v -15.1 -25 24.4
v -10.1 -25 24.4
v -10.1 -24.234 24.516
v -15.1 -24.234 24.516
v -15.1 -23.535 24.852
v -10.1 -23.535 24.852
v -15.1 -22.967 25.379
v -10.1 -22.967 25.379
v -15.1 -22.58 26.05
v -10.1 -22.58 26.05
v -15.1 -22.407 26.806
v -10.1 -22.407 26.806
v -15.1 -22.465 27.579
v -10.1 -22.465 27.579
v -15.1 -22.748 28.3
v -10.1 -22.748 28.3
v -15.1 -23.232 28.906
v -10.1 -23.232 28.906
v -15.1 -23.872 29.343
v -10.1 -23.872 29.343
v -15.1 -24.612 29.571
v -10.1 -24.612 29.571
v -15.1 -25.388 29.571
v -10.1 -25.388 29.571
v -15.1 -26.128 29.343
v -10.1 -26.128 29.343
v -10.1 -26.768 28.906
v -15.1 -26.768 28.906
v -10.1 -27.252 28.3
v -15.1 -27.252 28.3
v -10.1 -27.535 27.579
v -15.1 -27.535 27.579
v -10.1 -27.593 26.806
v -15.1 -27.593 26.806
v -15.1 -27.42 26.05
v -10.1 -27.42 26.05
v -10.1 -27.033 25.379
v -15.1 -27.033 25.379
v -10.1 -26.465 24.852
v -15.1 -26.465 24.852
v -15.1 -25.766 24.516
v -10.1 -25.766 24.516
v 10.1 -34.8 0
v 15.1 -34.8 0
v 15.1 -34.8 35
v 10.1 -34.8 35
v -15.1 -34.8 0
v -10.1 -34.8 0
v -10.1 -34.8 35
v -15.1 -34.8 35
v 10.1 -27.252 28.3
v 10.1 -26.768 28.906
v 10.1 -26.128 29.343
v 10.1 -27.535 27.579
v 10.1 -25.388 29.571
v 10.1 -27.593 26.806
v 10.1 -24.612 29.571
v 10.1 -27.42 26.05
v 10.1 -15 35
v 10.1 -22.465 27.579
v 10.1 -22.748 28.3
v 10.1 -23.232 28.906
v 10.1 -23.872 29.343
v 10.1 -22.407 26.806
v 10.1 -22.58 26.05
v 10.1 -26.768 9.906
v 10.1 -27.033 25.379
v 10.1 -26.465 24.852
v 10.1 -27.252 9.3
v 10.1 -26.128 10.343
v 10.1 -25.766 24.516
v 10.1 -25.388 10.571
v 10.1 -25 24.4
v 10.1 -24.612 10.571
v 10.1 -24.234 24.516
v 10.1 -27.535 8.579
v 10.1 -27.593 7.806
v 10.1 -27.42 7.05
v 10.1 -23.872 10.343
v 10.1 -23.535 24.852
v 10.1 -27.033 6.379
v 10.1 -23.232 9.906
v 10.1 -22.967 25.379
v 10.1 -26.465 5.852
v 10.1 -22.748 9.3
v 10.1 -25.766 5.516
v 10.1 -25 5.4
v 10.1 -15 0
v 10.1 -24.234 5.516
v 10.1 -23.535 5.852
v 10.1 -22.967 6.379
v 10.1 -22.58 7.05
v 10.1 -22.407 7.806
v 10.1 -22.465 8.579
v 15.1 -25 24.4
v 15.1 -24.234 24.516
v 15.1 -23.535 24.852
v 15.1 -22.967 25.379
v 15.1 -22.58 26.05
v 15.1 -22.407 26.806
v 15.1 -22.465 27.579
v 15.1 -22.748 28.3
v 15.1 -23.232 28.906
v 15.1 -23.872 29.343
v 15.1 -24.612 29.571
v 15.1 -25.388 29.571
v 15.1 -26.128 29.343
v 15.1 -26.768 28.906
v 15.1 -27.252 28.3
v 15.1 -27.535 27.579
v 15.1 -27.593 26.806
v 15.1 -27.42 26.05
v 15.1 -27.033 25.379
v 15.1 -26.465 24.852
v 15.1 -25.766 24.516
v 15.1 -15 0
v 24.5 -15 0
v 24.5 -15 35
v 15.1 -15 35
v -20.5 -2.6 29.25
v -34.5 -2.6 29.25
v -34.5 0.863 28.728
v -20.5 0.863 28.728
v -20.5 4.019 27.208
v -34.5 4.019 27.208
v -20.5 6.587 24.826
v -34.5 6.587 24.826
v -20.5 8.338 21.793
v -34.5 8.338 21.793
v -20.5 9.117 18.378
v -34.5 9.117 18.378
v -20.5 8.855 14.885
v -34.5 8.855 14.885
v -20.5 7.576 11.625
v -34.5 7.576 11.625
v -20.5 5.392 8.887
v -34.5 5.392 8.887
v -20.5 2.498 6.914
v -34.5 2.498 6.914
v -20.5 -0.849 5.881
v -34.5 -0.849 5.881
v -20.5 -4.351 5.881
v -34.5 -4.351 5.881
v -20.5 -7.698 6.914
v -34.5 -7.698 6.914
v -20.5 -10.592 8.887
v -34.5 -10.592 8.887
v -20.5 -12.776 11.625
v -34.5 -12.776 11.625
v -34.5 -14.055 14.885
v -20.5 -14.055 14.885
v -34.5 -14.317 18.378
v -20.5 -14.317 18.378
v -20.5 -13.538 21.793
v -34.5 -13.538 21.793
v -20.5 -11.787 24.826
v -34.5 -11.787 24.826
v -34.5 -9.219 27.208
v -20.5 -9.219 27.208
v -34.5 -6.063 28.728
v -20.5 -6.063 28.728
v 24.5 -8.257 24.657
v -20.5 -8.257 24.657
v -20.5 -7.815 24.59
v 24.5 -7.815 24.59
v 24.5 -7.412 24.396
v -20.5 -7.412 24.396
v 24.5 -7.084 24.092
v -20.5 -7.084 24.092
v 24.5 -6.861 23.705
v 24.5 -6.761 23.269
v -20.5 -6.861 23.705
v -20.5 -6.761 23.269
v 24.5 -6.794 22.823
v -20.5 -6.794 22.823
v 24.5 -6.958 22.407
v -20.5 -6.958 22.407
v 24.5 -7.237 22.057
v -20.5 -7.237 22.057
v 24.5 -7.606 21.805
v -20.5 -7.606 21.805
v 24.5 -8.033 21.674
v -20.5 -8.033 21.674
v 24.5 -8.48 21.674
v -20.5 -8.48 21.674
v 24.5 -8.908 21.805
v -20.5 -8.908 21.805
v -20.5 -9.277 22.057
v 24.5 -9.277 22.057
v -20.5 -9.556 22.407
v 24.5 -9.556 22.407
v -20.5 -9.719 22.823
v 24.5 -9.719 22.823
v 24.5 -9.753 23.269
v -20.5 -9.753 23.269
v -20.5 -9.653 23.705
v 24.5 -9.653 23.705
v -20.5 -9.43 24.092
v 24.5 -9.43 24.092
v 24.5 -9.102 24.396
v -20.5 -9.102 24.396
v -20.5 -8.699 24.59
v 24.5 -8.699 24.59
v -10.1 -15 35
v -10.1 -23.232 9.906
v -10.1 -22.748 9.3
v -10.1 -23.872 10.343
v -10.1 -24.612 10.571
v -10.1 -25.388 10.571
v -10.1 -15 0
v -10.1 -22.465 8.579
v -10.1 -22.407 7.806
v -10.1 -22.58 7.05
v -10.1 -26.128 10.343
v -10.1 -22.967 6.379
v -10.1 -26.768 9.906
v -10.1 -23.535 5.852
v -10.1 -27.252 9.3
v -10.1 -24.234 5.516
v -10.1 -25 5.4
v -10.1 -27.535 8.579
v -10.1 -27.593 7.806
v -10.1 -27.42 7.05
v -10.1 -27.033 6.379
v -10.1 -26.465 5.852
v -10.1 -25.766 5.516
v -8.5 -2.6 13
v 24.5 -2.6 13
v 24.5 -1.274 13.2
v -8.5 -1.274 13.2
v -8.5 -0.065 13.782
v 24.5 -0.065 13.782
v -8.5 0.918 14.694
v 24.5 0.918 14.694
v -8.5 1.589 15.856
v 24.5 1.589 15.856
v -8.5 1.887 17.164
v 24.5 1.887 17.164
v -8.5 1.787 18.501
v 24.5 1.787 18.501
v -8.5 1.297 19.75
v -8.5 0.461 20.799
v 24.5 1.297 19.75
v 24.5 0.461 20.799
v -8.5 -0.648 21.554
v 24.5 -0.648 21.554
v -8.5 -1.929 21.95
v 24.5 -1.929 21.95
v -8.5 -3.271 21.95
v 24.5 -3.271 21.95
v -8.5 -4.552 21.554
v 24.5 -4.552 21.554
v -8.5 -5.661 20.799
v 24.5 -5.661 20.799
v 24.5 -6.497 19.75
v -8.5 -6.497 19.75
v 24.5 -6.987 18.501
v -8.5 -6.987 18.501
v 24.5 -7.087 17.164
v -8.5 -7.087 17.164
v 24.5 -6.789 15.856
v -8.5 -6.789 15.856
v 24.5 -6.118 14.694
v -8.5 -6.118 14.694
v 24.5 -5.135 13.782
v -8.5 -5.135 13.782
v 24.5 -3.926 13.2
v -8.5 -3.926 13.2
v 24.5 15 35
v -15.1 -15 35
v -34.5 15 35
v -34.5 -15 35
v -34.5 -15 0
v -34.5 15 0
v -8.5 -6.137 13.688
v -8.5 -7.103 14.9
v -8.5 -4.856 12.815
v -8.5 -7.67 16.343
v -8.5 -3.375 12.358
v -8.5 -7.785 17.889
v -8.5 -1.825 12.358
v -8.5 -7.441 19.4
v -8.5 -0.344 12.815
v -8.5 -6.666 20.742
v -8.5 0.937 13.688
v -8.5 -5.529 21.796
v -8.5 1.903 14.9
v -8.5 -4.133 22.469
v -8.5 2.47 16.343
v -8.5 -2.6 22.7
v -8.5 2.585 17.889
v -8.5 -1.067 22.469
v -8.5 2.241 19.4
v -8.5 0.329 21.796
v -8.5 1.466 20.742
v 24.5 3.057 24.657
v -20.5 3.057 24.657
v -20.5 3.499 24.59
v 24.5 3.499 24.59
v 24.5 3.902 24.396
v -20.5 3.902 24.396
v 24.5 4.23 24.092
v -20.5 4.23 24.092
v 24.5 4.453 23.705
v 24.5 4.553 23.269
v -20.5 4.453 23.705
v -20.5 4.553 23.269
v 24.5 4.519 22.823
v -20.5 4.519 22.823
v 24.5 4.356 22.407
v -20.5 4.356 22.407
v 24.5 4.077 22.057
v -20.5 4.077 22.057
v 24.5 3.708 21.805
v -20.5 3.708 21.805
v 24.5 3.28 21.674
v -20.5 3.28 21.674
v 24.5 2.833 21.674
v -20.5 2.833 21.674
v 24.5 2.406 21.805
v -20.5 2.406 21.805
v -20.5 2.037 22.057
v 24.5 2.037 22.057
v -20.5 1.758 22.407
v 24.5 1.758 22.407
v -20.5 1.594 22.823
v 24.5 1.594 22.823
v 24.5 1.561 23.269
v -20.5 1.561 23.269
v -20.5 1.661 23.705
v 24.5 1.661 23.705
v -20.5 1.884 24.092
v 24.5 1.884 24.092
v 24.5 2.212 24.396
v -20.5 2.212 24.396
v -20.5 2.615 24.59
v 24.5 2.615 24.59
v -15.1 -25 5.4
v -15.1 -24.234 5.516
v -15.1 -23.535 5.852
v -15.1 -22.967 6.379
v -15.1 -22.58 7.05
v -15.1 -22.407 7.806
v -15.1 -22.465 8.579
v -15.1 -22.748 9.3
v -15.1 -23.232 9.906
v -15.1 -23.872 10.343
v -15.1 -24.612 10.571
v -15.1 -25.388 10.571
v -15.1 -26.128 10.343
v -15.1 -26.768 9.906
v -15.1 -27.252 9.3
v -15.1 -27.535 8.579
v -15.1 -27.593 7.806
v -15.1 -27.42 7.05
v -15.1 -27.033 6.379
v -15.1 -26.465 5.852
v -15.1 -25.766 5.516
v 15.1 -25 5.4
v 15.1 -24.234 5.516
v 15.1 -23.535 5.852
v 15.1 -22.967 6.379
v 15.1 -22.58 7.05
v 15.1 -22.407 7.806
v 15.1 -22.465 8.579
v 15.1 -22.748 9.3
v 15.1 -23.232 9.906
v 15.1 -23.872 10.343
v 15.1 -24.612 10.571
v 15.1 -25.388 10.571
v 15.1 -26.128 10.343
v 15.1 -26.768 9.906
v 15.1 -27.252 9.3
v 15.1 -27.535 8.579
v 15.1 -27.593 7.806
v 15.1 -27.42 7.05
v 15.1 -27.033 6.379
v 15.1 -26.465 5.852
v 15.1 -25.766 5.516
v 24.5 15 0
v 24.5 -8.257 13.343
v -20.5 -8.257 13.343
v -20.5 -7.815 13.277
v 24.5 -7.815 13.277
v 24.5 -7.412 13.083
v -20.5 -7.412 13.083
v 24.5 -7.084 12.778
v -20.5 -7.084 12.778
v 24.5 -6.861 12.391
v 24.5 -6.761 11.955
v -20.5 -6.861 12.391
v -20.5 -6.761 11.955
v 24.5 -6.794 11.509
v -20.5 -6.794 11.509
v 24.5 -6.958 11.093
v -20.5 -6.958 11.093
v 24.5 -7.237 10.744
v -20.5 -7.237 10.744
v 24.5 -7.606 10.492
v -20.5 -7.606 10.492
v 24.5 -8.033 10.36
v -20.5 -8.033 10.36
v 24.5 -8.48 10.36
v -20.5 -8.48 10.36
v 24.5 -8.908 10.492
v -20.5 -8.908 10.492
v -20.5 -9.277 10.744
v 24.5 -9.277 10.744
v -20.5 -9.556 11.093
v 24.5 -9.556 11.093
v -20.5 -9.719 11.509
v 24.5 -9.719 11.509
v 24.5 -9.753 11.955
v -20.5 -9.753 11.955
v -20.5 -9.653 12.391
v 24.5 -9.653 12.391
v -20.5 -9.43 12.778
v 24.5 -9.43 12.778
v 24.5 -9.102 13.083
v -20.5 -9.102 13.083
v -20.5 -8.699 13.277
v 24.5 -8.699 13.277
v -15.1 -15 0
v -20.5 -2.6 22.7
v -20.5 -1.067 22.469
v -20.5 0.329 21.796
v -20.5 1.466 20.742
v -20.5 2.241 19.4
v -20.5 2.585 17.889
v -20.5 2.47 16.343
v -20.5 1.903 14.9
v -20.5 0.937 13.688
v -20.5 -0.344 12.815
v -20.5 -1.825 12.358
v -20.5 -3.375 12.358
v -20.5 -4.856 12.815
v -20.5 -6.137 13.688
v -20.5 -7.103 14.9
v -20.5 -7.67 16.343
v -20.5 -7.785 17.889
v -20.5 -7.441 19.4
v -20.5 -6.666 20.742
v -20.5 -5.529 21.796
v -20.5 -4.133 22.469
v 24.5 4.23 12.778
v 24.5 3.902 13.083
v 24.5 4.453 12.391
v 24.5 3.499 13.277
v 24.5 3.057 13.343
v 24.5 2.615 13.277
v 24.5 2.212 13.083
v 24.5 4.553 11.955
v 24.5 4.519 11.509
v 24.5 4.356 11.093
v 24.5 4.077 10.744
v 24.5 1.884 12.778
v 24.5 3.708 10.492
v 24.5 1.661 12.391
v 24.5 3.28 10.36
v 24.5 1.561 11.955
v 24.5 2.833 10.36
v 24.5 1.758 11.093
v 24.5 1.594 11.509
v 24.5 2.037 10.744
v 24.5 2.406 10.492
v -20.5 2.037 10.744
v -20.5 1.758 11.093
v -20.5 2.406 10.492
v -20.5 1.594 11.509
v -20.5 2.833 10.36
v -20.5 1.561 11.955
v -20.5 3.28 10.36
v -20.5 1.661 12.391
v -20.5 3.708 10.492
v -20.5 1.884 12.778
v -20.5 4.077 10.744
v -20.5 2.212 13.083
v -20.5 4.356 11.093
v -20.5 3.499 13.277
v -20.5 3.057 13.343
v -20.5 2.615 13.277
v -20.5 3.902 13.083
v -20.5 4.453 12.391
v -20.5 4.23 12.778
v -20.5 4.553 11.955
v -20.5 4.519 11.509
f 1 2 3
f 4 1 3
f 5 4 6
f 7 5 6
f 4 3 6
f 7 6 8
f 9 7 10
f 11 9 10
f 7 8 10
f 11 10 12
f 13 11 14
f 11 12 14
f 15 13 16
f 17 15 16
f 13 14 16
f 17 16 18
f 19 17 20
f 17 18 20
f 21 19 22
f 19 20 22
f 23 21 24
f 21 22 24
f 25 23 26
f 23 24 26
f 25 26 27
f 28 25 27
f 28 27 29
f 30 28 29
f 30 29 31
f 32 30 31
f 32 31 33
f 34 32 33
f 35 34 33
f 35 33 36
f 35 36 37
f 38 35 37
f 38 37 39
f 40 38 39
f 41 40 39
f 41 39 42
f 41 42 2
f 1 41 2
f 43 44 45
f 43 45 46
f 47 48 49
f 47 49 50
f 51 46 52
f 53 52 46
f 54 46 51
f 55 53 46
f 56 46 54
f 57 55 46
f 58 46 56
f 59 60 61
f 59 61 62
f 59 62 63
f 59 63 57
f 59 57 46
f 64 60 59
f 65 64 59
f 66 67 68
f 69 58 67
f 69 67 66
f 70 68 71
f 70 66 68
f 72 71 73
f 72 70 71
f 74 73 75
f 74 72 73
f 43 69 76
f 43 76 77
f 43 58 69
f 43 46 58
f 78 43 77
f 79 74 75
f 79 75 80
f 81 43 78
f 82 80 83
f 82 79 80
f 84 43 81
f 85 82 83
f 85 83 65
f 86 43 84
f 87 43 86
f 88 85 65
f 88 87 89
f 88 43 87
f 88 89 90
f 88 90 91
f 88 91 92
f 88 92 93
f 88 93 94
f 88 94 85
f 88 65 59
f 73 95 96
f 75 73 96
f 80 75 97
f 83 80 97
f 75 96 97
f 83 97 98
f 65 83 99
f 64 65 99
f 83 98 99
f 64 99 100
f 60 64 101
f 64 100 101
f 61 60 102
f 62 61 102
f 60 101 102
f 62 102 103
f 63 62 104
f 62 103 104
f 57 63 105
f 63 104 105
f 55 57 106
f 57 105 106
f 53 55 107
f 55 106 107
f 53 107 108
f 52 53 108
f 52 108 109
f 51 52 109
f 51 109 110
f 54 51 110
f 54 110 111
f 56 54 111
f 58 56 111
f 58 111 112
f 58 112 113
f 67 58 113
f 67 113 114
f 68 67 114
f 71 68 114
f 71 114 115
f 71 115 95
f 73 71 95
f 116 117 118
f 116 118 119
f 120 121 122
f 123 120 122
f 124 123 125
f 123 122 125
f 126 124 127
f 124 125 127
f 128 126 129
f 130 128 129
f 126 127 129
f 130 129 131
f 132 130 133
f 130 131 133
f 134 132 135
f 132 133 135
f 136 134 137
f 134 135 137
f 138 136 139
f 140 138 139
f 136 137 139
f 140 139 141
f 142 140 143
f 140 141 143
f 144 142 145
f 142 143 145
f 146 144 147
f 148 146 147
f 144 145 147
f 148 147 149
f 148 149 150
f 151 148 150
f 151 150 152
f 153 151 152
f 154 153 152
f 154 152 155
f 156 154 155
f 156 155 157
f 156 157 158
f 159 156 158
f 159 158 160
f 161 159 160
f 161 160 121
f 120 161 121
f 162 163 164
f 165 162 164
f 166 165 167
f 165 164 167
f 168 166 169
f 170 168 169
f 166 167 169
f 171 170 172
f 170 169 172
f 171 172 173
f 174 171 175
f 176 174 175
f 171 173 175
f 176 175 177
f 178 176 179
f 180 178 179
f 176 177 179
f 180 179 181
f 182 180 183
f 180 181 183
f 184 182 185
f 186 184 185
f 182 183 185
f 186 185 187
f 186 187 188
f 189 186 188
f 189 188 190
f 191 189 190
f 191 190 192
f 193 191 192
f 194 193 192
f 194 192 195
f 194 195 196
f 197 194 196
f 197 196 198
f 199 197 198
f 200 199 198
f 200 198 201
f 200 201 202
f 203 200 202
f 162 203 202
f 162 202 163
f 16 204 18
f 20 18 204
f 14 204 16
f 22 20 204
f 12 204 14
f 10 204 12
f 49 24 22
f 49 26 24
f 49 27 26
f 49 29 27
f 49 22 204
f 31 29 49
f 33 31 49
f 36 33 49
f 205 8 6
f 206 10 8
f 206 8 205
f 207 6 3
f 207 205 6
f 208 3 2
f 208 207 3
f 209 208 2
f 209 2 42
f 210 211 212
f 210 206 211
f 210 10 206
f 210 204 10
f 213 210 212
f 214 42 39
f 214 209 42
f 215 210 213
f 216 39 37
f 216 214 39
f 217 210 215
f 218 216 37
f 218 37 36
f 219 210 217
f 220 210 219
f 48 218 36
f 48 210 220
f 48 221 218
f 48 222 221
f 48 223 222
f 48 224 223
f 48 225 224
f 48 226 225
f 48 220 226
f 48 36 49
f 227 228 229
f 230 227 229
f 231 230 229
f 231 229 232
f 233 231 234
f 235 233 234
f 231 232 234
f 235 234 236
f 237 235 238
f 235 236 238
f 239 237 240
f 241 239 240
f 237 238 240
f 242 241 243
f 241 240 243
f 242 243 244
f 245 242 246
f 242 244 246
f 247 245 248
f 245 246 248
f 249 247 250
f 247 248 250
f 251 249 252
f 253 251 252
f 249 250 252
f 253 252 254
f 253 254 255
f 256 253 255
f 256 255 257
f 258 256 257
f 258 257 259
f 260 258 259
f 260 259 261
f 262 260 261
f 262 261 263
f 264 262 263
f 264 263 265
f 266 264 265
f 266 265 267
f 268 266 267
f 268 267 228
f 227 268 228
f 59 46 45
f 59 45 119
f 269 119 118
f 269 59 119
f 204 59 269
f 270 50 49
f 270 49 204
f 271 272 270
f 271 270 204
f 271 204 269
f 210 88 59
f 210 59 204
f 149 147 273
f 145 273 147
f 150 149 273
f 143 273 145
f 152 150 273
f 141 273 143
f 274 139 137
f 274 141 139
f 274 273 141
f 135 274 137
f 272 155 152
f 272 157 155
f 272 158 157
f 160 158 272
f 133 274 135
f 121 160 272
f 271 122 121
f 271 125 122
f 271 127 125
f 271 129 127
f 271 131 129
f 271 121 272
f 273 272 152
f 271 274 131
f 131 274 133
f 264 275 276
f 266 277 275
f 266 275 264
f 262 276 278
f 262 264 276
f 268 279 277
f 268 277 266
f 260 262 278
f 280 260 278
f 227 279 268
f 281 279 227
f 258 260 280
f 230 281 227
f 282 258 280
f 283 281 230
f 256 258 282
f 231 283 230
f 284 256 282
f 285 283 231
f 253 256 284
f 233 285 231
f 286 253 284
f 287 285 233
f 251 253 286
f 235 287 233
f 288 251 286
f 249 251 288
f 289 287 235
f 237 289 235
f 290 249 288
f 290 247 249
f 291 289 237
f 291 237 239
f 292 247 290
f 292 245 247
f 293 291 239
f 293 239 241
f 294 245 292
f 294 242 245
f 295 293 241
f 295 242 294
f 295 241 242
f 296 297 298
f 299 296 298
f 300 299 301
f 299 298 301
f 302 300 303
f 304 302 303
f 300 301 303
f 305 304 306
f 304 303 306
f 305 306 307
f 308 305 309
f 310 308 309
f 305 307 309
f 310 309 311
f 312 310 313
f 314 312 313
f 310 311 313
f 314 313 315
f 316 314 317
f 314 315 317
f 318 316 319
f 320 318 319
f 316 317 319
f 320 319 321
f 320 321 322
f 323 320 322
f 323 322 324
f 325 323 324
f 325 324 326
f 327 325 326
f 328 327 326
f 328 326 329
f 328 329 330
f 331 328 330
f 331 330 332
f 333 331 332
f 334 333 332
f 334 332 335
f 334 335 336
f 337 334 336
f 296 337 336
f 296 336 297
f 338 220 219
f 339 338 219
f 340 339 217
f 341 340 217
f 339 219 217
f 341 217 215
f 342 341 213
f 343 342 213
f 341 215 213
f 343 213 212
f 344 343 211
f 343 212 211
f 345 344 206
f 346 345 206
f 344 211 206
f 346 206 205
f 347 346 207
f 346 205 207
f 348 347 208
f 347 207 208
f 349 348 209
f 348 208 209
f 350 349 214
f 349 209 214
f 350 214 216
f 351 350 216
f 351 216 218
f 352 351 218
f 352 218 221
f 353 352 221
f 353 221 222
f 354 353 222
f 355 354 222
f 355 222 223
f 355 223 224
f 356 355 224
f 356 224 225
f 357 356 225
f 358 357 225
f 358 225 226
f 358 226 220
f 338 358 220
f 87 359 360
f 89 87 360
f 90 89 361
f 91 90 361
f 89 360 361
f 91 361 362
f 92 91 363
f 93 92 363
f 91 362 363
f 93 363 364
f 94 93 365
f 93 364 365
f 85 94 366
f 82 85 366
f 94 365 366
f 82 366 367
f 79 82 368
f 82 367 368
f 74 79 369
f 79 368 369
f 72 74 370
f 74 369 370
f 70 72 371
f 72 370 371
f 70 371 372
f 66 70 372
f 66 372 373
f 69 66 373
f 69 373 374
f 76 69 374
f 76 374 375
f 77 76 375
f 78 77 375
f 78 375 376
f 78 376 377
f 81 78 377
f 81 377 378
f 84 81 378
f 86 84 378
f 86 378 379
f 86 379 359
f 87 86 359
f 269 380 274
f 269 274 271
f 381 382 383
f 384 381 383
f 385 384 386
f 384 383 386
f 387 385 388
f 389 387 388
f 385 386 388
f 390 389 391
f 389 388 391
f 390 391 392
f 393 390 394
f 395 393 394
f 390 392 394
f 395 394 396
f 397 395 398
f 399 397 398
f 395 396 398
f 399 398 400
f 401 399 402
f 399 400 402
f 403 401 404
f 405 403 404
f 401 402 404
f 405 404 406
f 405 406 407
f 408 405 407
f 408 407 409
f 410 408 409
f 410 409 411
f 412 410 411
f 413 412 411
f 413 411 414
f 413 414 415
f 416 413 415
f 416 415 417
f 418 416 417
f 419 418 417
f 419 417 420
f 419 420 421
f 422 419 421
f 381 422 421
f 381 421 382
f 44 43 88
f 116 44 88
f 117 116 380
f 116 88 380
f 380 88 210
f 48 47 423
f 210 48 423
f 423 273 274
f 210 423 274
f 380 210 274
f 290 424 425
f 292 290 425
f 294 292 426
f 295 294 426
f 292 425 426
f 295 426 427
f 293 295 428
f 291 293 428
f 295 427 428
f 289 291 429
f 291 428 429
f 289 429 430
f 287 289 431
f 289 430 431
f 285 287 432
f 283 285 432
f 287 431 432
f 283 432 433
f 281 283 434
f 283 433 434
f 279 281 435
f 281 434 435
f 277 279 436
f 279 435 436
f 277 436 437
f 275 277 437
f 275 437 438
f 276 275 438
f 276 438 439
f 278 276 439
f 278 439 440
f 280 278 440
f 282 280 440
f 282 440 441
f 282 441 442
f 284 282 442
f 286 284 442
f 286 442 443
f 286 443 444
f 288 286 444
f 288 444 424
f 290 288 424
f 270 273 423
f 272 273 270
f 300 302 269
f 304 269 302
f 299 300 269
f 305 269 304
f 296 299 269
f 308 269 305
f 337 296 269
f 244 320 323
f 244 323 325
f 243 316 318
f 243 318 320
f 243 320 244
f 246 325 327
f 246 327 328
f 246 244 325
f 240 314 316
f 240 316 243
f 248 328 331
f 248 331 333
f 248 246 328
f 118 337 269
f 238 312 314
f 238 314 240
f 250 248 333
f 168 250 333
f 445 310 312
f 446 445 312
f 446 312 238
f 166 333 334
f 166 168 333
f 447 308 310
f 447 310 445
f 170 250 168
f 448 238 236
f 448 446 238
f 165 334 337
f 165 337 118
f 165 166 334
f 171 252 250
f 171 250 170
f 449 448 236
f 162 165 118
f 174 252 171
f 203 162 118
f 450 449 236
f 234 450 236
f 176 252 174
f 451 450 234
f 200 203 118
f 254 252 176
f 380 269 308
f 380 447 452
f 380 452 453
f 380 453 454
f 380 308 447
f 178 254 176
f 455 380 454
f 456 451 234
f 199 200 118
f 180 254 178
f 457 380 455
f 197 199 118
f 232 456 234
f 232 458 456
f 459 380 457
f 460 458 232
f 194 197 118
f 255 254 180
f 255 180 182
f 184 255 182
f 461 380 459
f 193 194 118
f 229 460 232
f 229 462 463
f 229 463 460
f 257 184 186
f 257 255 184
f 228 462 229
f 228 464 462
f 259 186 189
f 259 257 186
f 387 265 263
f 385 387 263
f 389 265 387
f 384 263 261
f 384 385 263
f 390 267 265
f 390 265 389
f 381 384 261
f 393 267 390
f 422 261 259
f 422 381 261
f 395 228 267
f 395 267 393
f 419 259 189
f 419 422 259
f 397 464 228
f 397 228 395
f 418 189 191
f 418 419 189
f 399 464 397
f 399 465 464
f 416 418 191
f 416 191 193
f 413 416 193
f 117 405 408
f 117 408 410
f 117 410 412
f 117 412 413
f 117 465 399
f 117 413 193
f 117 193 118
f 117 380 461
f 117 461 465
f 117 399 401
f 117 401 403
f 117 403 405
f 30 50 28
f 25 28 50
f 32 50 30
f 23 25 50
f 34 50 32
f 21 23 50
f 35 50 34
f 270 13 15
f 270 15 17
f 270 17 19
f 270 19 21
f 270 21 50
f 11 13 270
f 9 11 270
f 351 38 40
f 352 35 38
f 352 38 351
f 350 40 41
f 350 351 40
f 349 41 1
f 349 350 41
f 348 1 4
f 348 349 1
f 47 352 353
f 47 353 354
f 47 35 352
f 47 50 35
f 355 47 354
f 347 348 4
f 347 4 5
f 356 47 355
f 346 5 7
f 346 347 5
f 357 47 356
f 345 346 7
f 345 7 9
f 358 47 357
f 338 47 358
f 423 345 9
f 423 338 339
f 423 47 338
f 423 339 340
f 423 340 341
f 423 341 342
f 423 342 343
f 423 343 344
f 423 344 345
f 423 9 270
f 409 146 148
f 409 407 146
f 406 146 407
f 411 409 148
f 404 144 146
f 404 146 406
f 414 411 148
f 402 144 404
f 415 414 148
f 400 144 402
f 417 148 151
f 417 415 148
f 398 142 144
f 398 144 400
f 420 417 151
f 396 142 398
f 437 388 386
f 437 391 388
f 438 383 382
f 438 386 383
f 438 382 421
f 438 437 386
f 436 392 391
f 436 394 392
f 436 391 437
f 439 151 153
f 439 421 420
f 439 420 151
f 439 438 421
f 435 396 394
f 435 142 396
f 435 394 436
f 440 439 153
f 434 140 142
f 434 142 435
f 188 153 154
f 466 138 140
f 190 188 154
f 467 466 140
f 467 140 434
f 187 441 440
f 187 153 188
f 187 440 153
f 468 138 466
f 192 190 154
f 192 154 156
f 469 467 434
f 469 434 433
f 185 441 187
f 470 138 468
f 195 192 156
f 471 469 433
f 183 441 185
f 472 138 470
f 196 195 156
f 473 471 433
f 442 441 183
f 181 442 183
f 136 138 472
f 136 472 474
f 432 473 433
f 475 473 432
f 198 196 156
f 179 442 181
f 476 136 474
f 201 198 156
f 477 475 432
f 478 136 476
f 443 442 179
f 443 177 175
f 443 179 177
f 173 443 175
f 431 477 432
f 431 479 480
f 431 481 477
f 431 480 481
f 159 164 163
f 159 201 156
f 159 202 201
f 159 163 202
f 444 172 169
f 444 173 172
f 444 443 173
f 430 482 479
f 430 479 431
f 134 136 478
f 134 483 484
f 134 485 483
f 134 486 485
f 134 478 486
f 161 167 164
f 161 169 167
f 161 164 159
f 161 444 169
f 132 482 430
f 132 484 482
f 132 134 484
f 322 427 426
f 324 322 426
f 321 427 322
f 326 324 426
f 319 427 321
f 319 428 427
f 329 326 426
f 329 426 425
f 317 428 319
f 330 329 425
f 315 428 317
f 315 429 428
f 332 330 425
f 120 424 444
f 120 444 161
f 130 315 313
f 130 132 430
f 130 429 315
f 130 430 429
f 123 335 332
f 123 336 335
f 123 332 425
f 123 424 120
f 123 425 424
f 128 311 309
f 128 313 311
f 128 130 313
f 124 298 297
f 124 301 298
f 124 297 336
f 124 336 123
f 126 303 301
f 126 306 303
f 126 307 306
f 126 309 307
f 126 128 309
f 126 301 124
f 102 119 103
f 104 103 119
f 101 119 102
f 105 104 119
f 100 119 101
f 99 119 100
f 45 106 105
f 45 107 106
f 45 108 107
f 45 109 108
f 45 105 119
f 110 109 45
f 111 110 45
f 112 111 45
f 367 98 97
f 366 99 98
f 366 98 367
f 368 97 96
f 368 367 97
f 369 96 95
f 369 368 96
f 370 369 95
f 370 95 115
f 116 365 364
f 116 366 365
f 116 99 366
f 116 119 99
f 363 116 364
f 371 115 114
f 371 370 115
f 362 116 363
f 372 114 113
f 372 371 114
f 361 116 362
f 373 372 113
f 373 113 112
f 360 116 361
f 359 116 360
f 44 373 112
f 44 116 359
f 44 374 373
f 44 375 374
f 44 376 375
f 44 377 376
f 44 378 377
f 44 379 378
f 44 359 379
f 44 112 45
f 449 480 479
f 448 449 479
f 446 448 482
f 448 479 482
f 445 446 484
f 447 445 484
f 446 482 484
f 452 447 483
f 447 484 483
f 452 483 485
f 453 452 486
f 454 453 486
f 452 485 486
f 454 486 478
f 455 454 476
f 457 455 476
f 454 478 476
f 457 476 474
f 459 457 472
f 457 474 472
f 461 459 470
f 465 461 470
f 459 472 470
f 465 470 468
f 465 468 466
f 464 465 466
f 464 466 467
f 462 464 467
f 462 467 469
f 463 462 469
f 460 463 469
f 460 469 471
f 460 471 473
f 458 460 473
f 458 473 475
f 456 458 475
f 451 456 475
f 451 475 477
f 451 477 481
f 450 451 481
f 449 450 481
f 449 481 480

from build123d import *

# Parameters (mm, degrees)
EXTRUDE_1_DEPTH     = 35
HOLE_WIZARD_1_D     = 9
SKETCH_12_R         = 1.5
CUT_EXTRUDE_1_DEPTH = 70.548831766
SKETCH_15_R         = 5.2
CUT_EXTRUDE_4_DEPTH = 16
SKETCH_14_R         = 11.75
CUT_EXTRUDE_3_DEPTH = 4
HOLE_WIZARD_2_D     = 5.2
HOLE_WIZARD_2_DEPTH = 100
EXTRUDE_START       = 10
SKETCH_18_W         = 35
SKETCH_18_H         = 30
SKETCH_18_R         = 11.75
EXTRUDE_2_DEPTH     = 10


with BuildPart() as part:
    # 草图1 → 凸台-拉伸1 (new body)
    with BuildSketch(Plane.XY):
        Polygon((15.1, -15), (15.1, -34.8), (10.1, -34.8), (10.1, -15), (-10.1, -15), (-10.1, -34.8), (-15.1, -34.8), (-15.1, -15), (-24.5, -15), (-24.5, 15), (24.5, 15), (24.5, -15), align=None)
    extrude(amount=EXTRUDE_1_DEPTH)

    # 孔1 (through all)
    with Locations(Plane.ZY.offset(24.5)):
        with Locations((17.5, -2.6)):
            Hole(HOLE_WIZARD_1_D / 2)

    # 草图12 → 切除-拉伸1 (cut, through all)
    with BuildSketch(Plane.ZY.offset(24.5)):
        with Locations((11.843145751, 3.056854249)):
            Circle(SKETCH_12_R)
        with Locations((23.156854249, 3.056854249)):
            Circle(SKETCH_12_R)
        with Locations((23.156854249, -8.256854249)):
            Circle(SKETCH_12_R)
        with Locations((11.843145751, -8.256854249)):
            Circle(SKETCH_12_R)
    extrude(amount=-CUT_EXTRUDE_1_DEPTH, mode=Mode.SUBTRACT)

    # 草图15 → 切除-拉伸4 (cut)
    with BuildSketch(Plane.ZY.offset(24.5)):
        with Locations((17.5, -2.6)):
            Circle(SKETCH_15_R)
    extrude(amount=-CUT_EXTRUDE_4_DEPTH, mode=Mode.SUBTRACT)

    # 草图14 → 切除-拉伸3 (cut)
    with BuildSketch(Plane.ZY.offset(24.5)):
        with Locations((17.5, -2.6)):
            Circle(SKETCH_14_R)
    extrude(amount=-CUT_EXTRUDE_3_DEPTH, mode=Mode.SUBTRACT)

    # 孔2
    with Locations(Plane.ZY.offset(15.1)):
        with Locations((8, -25), (27, -25)):
            Hole(HOLE_WIZARD_2_D / 2, depth=HOLE_WIZARD_2_DEPTH)

    # 草图18 → 凸台-拉伸2 (add)
    with BuildSketch(Plane.ZY.offset(24.5).offset(EXTRUDE_START)):
        with Locations((17.5, 0)):
            Rectangle(SKETCH_18_W, SKETCH_18_H)
        with Locations((17.5, -2.6)):
            Circle(SKETCH_18_R, mode=Mode.SUBTRACT)
    extrude(amount=-EXTRUDE_2_DEPTH)


solid = part.part
